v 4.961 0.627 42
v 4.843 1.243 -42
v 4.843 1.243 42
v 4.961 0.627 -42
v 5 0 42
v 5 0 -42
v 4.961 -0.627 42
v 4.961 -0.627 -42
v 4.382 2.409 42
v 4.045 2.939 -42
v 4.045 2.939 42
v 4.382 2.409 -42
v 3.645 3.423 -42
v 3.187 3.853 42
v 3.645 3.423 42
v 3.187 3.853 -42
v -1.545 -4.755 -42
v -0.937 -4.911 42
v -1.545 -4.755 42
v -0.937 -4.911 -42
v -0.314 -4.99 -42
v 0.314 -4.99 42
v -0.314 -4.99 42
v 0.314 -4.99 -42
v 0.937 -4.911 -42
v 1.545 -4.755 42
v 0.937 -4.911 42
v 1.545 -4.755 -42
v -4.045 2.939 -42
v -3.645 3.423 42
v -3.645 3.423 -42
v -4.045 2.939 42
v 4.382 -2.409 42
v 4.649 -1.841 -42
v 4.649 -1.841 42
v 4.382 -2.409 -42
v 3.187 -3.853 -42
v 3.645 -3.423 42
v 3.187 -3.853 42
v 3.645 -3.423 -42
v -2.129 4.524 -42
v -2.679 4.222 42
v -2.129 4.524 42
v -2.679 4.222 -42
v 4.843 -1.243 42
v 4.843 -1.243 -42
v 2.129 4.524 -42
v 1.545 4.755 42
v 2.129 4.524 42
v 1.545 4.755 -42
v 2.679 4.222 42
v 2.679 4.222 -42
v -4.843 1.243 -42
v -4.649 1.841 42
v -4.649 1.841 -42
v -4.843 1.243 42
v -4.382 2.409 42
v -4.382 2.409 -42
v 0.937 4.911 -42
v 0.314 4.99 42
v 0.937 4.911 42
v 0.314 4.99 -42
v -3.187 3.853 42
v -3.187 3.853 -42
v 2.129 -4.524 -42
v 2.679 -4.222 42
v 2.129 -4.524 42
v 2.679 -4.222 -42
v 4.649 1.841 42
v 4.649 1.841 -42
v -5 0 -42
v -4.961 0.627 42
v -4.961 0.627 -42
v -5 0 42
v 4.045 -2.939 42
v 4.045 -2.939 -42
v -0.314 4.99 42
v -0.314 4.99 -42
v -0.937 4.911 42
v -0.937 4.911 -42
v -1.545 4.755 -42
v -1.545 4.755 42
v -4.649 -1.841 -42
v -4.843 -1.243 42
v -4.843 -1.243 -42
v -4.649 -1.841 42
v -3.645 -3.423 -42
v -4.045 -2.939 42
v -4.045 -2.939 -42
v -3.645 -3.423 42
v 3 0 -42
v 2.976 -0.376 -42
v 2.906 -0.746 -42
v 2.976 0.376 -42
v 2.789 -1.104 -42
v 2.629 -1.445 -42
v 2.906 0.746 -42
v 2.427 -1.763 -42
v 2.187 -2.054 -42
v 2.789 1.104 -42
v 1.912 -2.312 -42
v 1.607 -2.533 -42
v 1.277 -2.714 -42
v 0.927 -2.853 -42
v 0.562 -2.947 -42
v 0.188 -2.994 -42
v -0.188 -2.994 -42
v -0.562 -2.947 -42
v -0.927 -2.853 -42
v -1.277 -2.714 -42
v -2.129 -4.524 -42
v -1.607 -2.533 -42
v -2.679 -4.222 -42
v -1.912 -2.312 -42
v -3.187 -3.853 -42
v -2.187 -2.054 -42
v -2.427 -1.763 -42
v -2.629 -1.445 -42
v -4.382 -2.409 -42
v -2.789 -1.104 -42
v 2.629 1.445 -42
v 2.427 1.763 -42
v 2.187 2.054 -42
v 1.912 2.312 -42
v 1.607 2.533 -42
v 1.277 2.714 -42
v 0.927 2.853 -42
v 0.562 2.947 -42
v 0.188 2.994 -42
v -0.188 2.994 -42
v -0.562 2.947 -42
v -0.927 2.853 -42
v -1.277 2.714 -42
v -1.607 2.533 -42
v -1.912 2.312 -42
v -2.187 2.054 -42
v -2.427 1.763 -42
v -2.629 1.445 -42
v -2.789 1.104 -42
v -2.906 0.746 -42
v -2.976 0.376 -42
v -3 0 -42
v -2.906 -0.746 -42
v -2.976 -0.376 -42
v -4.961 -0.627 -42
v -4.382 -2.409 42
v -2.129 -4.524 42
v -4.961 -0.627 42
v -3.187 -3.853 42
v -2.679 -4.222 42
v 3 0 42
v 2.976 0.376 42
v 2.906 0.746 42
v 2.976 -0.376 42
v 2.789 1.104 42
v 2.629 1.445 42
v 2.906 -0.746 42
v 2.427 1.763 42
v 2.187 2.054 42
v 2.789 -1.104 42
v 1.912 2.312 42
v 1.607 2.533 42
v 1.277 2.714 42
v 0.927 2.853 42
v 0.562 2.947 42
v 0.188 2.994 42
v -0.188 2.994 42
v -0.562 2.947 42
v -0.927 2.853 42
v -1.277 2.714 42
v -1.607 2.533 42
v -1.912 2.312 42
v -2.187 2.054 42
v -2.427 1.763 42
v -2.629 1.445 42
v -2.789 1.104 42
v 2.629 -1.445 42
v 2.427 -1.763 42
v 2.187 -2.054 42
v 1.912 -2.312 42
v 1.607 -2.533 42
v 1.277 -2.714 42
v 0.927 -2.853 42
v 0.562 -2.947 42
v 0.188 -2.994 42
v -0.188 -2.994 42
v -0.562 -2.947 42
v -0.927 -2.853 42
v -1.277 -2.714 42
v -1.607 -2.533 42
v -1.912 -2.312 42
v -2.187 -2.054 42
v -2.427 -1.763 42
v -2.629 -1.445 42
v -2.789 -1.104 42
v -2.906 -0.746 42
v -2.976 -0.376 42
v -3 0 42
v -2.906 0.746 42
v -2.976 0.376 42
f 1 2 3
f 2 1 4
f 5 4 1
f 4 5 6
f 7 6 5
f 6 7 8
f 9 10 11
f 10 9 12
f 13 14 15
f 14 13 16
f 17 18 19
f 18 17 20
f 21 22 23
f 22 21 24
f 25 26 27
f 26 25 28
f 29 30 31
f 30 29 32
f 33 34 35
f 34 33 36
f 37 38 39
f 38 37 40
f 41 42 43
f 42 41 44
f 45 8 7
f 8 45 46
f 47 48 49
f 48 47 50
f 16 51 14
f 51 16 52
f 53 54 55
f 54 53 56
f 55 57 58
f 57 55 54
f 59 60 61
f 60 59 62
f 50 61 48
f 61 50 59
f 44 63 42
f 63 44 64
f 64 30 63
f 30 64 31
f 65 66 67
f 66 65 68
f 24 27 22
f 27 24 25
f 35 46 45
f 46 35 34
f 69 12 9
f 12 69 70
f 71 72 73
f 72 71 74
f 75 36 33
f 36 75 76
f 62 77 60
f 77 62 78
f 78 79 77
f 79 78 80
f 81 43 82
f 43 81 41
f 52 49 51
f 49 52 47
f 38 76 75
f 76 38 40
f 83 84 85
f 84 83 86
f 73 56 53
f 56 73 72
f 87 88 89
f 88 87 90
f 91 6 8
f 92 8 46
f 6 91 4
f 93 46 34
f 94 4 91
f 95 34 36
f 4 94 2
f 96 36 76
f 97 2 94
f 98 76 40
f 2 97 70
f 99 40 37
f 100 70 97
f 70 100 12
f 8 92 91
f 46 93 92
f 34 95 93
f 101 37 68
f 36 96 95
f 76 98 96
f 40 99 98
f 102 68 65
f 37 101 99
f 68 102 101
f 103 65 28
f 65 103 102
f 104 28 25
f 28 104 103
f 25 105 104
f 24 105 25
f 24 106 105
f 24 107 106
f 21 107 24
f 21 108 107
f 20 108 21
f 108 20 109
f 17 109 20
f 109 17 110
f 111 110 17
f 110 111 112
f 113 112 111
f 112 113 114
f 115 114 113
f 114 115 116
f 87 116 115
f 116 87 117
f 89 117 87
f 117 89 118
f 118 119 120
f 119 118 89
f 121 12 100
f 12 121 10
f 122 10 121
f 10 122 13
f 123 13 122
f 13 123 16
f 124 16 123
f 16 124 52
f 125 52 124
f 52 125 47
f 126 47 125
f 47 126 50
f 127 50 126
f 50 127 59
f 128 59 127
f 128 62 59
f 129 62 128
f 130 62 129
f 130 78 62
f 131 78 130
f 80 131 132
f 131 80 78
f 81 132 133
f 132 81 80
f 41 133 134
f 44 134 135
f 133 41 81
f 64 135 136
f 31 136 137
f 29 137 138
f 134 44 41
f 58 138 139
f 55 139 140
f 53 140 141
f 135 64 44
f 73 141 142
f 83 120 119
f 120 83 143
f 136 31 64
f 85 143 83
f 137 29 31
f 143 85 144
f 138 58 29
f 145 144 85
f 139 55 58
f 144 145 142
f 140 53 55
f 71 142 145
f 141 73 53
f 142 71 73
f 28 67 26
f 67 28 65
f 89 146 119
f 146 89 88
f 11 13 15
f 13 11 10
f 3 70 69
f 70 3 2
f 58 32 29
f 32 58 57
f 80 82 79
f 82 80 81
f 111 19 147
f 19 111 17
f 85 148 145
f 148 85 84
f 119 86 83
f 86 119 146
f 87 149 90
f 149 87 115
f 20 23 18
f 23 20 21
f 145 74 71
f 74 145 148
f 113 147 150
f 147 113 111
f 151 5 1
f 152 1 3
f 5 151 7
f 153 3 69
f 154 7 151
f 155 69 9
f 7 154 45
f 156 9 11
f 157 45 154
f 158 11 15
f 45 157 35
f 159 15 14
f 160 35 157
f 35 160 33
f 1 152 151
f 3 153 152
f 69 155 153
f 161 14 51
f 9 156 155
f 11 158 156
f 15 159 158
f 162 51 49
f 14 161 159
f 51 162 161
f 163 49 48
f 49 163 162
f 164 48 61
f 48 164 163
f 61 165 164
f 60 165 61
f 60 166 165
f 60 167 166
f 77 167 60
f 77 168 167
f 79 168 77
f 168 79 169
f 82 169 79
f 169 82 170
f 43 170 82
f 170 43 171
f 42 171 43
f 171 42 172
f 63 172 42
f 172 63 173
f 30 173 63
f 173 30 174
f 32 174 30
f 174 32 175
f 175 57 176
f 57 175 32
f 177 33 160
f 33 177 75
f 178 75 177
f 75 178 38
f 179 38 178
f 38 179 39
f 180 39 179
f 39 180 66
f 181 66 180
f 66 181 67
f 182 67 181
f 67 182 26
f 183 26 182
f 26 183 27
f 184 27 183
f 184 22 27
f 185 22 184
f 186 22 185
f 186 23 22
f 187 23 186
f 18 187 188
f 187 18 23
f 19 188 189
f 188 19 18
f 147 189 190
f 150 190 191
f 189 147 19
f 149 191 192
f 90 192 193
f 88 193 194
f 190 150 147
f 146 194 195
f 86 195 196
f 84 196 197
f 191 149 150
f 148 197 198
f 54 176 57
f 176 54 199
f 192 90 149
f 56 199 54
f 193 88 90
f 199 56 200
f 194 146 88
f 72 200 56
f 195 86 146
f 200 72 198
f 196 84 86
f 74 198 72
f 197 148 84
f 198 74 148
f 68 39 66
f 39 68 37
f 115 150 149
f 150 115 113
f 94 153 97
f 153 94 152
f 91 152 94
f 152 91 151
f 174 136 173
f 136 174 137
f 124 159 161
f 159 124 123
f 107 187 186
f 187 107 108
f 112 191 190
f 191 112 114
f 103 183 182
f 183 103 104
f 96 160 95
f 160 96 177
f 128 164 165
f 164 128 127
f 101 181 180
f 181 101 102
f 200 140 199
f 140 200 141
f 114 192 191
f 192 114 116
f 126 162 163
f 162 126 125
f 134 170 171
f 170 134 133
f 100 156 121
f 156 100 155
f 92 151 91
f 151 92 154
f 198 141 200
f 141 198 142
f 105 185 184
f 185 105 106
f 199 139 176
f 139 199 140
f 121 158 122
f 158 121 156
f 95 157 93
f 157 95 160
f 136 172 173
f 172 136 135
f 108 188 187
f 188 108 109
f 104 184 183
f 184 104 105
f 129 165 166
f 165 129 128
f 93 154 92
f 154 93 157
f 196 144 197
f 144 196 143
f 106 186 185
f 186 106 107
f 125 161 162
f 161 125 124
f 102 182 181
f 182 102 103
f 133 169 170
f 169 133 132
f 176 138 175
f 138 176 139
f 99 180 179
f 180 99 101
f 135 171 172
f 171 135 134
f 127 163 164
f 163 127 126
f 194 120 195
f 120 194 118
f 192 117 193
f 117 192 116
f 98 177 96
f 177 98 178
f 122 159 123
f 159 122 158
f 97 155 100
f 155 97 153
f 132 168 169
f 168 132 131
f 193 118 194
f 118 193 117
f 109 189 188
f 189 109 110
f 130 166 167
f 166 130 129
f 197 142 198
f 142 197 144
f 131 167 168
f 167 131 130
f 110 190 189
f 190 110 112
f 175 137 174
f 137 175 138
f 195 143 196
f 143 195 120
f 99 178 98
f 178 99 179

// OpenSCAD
$fn = 50;


difference() {
	union() {
		translate(v = [0, 0, -42.0000000000]) {
			cylinder(h = 84, r = 5.0000000000);
		}
	}
	union() {
		translate(v = [0, 0, -100.0000000000]) {
			cylinder(h = 200, r = 3.0000000000);
		}
	}
}
